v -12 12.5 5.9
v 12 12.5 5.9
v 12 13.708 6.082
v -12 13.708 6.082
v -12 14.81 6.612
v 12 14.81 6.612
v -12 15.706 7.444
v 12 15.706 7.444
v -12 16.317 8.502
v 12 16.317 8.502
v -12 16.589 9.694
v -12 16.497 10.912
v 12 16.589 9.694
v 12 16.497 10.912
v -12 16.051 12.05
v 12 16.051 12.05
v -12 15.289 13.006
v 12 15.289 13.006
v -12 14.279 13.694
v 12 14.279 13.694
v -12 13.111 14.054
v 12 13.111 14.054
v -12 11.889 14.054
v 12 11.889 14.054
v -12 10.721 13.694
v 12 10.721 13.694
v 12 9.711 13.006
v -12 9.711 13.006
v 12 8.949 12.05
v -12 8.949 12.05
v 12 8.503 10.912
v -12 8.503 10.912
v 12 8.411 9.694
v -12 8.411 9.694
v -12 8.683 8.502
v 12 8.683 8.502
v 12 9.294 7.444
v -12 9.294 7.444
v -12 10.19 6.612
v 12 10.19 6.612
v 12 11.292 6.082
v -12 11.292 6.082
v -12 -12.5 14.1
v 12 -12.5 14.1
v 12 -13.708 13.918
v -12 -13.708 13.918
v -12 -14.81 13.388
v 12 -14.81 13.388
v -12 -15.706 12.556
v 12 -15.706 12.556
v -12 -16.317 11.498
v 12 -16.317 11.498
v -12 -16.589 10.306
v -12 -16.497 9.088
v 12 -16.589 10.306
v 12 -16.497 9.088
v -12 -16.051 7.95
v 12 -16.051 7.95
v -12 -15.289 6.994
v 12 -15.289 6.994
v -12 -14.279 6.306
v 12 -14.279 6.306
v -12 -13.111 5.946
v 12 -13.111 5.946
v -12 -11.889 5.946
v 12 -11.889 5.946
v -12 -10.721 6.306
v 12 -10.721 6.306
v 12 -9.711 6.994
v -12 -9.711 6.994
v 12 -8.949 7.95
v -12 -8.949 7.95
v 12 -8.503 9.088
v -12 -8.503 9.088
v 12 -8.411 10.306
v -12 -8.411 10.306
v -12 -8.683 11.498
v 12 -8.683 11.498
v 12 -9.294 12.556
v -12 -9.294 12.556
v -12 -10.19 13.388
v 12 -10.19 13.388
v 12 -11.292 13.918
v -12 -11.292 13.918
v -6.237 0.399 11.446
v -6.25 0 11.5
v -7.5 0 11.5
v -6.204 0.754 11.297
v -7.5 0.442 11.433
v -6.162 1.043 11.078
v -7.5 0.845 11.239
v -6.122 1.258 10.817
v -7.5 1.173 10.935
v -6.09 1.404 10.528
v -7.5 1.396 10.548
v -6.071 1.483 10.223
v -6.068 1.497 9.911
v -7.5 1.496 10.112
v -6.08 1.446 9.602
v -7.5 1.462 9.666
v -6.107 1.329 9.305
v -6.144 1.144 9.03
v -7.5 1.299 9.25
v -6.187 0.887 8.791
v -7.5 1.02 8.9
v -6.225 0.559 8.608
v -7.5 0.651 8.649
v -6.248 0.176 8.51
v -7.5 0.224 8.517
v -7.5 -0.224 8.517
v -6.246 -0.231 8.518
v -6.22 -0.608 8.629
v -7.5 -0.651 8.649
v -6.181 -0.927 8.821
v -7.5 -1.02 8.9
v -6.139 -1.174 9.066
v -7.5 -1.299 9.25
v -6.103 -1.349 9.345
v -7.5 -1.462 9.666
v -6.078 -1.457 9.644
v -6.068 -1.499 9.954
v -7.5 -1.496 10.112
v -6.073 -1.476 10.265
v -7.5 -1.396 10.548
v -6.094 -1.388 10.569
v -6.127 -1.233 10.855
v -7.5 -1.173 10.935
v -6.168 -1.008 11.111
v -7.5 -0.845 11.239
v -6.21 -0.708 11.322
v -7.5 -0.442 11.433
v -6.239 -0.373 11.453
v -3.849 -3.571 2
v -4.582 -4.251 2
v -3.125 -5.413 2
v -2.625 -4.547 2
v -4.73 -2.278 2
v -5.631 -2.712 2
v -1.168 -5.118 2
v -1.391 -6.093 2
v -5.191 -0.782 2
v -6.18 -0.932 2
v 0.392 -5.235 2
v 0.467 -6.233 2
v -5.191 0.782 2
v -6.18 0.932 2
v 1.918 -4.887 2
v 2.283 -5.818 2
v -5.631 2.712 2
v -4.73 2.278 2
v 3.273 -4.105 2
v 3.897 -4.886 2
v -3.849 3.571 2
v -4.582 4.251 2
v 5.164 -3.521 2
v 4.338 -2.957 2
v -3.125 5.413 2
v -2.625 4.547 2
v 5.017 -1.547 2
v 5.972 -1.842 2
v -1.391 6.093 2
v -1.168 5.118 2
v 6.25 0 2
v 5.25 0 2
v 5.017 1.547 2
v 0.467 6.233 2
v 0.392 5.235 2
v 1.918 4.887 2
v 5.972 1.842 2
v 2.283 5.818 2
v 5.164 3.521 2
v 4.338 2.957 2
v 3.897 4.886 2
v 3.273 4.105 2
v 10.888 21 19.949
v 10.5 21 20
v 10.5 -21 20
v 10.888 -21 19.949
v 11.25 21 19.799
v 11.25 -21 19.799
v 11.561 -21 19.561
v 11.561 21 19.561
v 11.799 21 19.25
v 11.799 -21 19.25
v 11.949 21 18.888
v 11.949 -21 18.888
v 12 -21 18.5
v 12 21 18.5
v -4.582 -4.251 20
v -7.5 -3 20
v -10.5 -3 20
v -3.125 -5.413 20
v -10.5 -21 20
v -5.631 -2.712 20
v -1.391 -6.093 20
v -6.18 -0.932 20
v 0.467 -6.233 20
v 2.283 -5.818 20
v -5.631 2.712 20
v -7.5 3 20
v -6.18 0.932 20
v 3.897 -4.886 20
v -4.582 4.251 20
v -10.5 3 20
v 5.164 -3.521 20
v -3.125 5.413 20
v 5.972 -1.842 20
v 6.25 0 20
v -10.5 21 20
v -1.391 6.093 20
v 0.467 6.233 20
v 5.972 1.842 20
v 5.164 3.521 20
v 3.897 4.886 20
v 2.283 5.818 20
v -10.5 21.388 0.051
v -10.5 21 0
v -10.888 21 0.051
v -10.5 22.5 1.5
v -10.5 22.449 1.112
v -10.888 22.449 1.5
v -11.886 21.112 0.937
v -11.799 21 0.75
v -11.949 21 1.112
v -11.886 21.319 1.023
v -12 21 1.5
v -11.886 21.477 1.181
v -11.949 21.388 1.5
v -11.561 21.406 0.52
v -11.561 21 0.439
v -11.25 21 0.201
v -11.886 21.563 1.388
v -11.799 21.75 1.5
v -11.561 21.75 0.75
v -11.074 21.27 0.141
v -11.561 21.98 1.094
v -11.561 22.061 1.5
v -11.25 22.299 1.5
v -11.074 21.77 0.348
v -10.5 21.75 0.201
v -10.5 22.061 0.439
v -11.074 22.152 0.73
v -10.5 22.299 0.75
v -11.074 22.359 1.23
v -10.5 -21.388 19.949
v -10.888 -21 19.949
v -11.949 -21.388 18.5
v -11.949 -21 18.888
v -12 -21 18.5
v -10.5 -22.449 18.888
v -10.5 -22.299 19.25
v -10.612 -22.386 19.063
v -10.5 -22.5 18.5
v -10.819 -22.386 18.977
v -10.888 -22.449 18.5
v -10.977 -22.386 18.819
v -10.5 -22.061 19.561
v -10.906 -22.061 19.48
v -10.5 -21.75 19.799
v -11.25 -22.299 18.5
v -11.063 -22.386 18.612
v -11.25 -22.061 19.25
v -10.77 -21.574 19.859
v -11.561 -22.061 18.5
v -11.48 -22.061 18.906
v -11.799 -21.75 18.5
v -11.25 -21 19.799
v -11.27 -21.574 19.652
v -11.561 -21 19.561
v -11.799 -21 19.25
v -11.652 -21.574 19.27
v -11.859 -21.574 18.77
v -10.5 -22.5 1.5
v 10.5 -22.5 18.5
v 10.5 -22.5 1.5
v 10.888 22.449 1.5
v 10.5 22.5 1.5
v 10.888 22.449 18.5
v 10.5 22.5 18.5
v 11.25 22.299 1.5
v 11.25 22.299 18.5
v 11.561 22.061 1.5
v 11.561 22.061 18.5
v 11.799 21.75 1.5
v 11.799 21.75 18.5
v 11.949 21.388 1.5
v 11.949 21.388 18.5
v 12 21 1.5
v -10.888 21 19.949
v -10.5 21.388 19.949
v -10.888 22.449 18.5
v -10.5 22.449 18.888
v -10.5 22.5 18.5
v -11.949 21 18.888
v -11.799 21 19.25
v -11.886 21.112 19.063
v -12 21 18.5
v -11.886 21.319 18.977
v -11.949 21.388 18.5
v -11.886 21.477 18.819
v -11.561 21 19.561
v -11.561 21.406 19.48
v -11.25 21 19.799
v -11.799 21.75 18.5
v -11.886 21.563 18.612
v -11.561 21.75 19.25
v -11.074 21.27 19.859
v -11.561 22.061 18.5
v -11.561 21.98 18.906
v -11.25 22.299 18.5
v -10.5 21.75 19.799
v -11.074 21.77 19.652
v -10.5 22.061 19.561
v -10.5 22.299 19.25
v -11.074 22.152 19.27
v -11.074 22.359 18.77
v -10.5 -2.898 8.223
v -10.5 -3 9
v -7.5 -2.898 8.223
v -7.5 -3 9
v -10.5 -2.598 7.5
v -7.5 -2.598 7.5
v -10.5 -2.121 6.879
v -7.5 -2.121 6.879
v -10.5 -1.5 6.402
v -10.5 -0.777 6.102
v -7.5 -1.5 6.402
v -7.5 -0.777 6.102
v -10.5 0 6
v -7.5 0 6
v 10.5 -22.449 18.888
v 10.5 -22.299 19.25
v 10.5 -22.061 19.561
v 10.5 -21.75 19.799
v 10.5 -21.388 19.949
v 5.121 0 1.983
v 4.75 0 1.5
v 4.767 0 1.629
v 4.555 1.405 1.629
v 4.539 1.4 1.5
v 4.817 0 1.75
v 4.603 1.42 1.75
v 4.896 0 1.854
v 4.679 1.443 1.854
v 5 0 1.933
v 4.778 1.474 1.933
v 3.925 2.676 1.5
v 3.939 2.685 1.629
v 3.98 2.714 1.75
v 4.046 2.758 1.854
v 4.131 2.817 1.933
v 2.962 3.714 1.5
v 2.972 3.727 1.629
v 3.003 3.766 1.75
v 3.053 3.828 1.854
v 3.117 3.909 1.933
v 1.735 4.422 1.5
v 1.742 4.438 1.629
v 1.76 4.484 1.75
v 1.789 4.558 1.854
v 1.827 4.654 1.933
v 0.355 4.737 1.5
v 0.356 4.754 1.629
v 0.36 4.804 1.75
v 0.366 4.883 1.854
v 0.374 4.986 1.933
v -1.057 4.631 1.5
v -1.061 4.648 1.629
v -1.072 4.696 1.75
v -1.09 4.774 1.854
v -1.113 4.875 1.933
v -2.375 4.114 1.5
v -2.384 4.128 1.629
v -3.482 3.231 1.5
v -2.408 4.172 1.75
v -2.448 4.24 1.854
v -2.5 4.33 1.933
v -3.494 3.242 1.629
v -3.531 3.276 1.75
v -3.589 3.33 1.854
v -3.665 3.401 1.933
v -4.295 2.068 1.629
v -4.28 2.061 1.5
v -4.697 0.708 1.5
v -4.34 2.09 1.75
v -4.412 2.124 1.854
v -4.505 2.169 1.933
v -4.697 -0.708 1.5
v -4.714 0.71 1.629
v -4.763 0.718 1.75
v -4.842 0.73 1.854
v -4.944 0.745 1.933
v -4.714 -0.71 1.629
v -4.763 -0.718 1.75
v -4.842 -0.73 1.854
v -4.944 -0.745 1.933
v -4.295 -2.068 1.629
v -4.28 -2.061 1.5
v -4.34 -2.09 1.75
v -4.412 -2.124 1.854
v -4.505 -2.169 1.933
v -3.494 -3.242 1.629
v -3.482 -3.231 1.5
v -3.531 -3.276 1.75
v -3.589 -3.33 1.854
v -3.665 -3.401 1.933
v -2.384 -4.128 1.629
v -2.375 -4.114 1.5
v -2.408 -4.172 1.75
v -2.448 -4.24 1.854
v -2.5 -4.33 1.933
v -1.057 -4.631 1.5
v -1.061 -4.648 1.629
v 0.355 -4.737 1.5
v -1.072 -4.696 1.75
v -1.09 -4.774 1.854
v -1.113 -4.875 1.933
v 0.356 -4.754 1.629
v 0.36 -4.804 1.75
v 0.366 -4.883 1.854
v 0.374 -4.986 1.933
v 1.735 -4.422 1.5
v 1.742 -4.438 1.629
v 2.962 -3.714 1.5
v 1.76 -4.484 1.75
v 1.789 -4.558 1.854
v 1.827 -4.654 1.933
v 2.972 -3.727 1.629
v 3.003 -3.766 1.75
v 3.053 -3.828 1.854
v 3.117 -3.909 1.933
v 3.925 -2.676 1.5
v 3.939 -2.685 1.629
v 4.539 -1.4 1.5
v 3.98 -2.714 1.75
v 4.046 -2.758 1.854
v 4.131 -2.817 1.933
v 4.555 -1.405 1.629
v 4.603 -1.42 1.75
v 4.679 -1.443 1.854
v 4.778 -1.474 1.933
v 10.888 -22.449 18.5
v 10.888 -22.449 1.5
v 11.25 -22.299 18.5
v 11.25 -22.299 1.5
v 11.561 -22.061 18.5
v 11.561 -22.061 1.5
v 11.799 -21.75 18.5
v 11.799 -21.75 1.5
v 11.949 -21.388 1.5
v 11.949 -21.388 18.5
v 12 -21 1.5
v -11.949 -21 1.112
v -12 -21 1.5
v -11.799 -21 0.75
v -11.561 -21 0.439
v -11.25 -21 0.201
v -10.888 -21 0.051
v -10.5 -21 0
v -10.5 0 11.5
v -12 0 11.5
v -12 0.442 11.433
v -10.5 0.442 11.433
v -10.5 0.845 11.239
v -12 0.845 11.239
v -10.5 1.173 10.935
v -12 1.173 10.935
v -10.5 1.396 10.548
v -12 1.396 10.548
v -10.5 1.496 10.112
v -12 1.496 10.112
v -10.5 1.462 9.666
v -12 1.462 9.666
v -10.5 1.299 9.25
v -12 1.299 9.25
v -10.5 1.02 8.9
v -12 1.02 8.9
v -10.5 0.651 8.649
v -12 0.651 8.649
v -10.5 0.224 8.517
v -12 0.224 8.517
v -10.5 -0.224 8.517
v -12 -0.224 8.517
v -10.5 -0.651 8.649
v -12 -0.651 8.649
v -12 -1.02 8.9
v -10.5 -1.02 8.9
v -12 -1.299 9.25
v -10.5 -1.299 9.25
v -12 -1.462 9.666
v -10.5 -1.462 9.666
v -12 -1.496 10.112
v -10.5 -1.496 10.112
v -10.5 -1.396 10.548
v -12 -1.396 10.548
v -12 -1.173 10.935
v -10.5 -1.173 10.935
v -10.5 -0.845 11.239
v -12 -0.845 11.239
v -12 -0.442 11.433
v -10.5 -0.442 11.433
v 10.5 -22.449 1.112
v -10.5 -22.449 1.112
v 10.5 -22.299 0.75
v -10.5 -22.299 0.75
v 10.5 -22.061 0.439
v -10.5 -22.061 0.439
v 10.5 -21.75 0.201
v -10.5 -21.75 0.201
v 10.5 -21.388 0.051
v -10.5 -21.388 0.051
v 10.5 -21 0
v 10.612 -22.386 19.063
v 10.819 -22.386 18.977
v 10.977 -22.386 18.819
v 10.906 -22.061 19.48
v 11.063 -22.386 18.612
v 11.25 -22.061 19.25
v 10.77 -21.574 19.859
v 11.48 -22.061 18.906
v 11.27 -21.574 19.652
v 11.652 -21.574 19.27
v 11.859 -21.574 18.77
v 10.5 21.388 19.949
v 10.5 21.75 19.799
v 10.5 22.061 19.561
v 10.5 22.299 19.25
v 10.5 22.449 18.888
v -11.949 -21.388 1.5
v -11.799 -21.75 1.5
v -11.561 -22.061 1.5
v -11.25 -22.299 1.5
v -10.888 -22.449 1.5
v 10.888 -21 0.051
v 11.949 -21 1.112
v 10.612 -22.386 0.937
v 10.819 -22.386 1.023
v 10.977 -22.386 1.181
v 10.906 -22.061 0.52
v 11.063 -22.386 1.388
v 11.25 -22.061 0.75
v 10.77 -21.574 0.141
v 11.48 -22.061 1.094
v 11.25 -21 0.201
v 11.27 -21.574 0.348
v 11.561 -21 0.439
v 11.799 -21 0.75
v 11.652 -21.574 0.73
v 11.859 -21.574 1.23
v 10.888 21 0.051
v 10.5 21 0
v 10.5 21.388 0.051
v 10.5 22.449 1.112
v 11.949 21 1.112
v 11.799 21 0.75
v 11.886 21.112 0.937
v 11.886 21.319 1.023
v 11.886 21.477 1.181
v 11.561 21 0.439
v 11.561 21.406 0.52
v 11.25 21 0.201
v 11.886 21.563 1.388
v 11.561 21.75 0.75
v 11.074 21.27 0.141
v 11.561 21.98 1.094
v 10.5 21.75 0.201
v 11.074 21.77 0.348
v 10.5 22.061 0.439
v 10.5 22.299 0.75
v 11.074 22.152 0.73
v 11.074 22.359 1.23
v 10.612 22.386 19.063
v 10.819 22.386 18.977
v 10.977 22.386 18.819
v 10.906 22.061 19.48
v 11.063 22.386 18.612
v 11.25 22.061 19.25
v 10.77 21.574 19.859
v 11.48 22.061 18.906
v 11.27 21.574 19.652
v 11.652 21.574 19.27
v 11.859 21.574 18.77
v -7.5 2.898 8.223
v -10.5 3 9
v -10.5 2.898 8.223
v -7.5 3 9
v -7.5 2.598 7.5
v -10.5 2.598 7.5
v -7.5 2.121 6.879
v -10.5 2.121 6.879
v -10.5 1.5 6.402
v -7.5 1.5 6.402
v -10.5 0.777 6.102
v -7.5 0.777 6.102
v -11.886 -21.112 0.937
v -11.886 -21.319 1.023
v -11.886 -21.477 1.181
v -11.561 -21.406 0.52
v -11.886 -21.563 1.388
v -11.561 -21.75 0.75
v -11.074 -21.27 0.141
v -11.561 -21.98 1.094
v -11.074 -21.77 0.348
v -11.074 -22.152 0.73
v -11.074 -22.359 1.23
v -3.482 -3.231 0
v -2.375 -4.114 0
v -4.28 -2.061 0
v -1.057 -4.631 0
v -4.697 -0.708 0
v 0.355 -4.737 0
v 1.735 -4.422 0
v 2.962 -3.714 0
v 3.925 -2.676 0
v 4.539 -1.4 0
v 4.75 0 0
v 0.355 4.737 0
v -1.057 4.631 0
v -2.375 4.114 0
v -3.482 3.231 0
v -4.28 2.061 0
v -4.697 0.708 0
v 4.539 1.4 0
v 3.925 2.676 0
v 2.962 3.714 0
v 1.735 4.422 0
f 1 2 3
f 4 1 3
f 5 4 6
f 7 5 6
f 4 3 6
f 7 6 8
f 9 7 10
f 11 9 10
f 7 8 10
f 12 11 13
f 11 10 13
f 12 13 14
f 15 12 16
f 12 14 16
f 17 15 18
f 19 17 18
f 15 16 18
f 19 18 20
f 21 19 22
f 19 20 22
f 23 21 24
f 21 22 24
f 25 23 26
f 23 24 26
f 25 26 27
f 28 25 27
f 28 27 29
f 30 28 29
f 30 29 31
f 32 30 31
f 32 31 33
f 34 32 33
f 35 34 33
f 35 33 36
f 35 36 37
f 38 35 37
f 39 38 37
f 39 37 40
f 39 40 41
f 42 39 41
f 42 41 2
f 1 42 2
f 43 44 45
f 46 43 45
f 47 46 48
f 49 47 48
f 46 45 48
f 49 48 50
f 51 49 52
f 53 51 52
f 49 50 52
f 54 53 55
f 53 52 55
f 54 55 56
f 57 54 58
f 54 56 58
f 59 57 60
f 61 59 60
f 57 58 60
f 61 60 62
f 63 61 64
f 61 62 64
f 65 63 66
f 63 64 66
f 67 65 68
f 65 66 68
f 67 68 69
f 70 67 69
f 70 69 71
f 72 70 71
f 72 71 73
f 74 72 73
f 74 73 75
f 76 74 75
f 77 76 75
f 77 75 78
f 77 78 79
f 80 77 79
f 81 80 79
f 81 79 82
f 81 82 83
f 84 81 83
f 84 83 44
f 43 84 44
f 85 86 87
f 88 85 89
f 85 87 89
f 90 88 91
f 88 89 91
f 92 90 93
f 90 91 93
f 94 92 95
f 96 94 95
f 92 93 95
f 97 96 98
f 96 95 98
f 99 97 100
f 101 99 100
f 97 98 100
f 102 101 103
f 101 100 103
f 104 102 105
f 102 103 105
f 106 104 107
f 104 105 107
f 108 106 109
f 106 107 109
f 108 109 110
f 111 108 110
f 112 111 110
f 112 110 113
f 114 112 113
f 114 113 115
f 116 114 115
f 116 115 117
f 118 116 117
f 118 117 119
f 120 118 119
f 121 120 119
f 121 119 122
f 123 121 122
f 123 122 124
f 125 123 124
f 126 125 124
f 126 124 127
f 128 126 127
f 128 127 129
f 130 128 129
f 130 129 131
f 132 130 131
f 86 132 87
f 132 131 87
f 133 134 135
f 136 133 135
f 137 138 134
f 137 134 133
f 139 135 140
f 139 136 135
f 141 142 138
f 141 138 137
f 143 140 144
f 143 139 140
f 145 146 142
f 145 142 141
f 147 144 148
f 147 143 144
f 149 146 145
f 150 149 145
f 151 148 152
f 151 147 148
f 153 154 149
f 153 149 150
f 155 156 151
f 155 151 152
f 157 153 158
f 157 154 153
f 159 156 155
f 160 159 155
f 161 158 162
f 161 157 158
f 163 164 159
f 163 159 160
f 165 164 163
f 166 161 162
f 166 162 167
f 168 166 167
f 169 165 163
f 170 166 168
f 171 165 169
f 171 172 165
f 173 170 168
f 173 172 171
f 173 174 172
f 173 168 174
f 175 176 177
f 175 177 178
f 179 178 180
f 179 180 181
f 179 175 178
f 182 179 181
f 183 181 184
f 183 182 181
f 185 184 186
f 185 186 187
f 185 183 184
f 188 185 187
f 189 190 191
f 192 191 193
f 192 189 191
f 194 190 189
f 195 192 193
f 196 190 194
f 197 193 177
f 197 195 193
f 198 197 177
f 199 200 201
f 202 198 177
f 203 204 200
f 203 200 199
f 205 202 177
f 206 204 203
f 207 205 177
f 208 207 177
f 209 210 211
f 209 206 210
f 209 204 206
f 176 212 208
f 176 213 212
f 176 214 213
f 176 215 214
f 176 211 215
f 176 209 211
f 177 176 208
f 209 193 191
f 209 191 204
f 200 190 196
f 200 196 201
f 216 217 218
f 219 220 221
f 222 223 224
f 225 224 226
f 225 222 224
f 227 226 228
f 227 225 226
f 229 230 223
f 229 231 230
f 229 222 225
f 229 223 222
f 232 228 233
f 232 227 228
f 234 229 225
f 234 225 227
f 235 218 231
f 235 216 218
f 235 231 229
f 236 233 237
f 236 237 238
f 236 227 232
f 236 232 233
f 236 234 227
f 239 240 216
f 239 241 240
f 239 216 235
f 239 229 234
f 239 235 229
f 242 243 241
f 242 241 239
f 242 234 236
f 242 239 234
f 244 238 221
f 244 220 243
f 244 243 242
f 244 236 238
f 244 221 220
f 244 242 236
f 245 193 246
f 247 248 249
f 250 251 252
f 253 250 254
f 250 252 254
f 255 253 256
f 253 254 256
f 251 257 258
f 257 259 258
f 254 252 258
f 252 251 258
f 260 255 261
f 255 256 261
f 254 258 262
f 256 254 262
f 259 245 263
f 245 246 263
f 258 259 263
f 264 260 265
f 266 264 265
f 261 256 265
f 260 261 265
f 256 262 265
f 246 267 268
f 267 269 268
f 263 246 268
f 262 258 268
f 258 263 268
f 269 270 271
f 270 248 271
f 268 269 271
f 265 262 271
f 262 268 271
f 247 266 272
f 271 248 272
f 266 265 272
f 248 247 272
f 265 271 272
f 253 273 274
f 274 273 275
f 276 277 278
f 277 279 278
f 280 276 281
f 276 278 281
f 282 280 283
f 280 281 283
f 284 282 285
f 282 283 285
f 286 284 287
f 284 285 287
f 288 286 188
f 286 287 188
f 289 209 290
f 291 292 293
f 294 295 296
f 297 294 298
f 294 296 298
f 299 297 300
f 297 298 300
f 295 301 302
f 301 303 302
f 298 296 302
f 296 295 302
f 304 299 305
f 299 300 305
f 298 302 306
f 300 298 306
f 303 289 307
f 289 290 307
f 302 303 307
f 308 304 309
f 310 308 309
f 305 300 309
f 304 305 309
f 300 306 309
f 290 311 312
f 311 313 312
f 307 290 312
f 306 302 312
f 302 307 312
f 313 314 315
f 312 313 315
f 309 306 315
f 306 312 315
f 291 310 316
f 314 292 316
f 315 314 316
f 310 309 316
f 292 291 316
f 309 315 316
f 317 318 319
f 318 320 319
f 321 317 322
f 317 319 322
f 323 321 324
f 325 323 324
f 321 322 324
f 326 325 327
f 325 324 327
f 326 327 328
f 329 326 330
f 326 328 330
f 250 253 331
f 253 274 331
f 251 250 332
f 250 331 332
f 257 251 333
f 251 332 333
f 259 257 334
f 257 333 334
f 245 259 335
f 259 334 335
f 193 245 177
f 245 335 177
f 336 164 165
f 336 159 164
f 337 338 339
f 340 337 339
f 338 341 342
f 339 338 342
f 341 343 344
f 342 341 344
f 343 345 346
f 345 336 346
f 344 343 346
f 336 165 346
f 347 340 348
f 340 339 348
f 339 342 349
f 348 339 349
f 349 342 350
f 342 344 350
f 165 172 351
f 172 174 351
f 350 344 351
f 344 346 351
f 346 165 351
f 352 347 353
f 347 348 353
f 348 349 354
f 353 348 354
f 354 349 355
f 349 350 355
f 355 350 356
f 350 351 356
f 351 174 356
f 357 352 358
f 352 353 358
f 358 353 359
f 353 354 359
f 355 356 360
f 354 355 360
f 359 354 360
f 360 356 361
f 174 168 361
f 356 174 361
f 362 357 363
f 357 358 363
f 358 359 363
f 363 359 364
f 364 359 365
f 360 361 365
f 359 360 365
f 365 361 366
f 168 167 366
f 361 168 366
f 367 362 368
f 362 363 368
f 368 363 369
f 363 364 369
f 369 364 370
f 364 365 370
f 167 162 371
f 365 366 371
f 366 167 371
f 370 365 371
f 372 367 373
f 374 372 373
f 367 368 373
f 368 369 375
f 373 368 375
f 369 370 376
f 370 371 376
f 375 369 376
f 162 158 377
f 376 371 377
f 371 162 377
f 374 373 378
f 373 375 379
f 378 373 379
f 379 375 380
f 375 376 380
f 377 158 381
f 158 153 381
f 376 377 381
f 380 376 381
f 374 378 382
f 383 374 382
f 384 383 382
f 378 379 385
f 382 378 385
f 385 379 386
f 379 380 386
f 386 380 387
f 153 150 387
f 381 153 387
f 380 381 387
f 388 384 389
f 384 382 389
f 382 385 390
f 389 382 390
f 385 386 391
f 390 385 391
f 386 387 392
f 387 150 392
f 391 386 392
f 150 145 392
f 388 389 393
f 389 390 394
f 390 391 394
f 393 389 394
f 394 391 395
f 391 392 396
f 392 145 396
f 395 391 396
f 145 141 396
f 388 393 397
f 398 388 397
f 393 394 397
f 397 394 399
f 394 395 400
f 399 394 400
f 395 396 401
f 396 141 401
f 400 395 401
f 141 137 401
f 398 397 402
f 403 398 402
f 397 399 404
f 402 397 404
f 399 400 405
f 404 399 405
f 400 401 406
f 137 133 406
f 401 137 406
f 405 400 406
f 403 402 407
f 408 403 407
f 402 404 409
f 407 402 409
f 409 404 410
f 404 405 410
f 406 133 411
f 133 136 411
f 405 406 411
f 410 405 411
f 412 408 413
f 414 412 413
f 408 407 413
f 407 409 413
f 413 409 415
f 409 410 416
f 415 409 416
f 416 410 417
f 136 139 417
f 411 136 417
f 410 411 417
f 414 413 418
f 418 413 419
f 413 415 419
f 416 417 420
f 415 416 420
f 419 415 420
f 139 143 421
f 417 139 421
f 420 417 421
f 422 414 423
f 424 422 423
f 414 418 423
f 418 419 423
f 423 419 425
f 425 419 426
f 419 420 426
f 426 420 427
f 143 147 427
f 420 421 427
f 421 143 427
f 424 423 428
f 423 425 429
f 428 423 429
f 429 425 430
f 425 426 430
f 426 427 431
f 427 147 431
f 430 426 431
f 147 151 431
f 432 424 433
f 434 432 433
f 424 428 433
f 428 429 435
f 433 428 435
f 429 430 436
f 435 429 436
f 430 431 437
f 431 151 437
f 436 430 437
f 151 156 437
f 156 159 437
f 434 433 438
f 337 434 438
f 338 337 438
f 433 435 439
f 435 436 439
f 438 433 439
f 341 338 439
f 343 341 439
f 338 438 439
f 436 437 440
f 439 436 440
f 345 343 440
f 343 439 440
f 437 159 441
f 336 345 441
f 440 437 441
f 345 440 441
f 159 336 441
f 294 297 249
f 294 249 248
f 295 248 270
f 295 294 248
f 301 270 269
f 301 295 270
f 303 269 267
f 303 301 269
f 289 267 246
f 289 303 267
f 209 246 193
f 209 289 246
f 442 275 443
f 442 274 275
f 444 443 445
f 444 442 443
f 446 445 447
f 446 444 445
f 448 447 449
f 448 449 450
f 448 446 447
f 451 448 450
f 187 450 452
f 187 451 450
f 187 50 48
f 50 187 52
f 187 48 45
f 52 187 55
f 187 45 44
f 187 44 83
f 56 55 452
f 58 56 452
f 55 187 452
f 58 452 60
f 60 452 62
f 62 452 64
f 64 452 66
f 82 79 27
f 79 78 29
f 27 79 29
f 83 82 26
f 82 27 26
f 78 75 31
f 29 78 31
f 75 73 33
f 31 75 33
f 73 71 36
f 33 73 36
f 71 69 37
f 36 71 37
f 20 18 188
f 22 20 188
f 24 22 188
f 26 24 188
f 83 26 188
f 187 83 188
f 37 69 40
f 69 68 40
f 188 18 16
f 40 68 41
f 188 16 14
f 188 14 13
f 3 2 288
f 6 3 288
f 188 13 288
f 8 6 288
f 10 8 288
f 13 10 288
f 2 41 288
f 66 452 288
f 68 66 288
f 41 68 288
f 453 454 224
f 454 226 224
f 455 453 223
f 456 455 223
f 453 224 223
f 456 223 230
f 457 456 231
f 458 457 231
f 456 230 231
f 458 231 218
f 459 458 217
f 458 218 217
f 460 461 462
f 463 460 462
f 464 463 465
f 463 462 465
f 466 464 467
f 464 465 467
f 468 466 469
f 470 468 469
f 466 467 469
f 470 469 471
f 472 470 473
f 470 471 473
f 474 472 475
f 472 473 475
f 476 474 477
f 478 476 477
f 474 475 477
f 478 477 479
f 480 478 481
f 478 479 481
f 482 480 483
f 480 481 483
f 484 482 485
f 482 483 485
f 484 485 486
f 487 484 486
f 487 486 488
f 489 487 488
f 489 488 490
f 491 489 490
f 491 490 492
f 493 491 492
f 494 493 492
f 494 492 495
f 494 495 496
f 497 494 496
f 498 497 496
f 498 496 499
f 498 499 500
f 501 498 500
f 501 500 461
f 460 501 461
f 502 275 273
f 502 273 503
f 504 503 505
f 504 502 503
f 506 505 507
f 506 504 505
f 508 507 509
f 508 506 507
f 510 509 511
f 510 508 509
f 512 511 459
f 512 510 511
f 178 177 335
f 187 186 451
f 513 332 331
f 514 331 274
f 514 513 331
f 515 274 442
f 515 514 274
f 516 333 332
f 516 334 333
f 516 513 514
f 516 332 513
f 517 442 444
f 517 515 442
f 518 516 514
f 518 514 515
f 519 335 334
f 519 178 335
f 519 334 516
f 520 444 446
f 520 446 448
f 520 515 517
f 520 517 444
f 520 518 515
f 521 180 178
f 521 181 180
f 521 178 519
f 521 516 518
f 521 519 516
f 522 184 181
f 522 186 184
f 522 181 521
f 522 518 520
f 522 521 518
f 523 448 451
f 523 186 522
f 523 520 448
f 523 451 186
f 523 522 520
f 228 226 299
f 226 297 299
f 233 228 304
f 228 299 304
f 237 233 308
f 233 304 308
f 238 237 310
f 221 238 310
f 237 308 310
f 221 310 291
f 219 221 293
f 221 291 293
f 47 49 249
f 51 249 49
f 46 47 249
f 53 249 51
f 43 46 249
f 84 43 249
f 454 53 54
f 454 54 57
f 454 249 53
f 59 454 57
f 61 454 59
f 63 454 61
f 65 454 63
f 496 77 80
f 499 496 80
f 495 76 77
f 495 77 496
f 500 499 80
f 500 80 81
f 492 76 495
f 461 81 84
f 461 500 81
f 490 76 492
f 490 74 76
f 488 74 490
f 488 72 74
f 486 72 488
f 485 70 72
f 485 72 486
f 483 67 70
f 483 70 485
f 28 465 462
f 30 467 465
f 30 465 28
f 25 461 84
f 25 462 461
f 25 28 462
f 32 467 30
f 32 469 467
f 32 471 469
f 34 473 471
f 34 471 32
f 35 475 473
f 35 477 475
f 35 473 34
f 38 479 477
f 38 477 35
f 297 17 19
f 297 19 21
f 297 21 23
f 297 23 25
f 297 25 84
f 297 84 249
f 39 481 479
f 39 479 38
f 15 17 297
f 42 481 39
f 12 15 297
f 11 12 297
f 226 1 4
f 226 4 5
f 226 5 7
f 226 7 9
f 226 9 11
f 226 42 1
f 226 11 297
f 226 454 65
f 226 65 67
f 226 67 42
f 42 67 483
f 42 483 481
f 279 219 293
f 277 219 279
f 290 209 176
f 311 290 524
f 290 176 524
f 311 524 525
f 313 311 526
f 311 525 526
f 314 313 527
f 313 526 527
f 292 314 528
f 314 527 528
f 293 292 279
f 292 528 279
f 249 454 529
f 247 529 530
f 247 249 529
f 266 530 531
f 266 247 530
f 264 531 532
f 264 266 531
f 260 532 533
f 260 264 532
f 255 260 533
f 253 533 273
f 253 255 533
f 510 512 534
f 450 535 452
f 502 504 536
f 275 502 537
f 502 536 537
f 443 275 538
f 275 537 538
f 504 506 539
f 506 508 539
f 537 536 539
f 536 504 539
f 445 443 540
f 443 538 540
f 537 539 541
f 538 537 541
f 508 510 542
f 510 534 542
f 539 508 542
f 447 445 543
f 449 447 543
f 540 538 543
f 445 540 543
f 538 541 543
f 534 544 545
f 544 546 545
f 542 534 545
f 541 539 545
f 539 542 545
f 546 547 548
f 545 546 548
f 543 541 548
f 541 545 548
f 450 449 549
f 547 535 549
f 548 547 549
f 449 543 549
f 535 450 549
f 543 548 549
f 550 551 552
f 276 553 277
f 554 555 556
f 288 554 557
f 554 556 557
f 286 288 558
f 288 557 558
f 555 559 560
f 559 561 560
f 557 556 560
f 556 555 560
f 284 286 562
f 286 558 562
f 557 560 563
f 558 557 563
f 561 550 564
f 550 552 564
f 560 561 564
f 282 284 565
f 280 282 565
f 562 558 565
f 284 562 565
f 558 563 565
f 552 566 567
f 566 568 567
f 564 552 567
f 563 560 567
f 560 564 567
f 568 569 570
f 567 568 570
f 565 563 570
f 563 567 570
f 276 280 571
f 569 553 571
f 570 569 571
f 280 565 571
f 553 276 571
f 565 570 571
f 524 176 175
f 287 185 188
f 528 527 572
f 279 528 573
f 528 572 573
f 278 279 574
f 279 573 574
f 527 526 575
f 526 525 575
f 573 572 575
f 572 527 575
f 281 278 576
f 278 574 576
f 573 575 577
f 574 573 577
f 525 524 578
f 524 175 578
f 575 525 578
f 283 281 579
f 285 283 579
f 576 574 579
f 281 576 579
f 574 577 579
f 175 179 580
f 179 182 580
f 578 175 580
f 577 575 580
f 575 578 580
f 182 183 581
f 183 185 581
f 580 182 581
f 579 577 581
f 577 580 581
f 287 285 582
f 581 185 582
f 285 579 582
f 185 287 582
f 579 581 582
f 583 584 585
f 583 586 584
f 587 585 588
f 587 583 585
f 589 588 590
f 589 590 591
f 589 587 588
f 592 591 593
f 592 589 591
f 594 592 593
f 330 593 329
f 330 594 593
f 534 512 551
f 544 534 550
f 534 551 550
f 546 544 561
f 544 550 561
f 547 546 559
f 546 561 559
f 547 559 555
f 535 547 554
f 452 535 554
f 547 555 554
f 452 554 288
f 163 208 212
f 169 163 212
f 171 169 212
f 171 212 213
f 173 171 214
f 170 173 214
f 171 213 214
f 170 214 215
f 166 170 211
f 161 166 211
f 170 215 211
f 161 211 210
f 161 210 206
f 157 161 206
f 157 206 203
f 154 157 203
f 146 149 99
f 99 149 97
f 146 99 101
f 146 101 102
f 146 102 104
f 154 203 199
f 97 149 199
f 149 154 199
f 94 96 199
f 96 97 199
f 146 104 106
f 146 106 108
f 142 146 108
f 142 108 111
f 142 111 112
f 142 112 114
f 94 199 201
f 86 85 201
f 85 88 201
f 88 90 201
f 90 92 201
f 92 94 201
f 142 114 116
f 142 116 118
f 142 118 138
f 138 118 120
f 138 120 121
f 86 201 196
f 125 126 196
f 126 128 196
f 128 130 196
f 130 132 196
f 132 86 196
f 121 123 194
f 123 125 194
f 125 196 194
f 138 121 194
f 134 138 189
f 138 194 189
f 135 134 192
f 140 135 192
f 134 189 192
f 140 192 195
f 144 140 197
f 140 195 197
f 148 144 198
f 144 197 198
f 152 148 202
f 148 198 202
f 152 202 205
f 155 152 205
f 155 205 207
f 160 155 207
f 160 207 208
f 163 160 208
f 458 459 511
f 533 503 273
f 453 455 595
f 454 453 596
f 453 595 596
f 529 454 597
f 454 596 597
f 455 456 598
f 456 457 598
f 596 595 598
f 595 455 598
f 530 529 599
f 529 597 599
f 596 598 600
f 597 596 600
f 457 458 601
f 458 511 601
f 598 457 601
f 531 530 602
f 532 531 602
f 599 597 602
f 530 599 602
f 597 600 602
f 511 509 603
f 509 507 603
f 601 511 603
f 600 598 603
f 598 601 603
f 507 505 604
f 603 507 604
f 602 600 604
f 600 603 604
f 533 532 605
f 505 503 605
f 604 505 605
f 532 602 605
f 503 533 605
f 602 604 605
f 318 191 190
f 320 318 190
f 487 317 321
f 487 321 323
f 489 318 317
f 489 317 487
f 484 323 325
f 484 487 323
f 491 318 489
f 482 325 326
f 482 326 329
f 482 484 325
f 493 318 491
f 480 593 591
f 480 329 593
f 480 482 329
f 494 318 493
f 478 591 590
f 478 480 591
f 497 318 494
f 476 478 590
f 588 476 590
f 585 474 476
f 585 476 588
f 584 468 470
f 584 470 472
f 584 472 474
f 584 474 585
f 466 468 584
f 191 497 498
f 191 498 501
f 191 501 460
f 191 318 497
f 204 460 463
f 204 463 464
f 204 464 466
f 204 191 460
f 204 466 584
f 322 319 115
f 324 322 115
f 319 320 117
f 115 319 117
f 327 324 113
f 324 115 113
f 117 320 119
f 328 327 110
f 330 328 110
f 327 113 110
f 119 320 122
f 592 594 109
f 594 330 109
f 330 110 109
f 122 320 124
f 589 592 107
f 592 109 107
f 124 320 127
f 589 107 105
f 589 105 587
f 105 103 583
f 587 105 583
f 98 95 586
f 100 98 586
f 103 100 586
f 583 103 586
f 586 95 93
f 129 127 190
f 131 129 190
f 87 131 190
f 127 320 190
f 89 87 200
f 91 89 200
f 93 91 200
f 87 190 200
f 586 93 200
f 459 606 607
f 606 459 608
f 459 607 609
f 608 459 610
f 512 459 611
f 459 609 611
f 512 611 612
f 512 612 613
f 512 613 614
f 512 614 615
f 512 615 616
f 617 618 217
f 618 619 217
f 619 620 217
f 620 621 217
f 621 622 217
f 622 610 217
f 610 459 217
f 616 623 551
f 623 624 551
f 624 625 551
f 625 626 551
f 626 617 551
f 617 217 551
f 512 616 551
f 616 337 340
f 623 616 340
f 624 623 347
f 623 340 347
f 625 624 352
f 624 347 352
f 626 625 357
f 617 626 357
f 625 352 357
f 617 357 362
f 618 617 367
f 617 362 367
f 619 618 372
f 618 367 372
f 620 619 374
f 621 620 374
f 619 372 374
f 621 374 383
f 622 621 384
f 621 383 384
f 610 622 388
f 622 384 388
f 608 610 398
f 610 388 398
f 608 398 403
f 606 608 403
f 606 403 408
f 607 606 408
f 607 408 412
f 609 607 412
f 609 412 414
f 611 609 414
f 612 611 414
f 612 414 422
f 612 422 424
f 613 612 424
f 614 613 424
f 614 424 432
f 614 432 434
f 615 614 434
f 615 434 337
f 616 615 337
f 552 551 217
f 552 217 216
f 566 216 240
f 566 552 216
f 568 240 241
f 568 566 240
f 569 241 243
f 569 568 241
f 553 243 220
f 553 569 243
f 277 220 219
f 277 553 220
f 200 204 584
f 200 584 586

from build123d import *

# Parameters (mm, degrees)
SKETCH1_W      = 24
SKETCH1_H      = 45
EXTRUDE1_DEPTH = 20
SKETCH2_R      = 4.1
EXTRUDE2_DEPTH = 39.5
SKETCH3_R      = 6.25
EXTRUDE3_DEPTH = 18
SKETCH4_R      = 4.75
EXTRUDE4_DEPTH = 18
SKETCH5_W      = 3
SKETCH5_H      = 6
EXTRUDE5_DEPTH = 14
SKETCH6_R      = 1.5
EXTRUDE6_DEPTH = 13
FILLET1_R      = 1.5
FILLET2_R      = 0.5
FILLET3_R      = 3


with BuildPart() as part:
    # Sketch1 → Extrude1 (new body)
    with BuildSketch(Plane.XY):
        Rectangle(SKETCH1_W, SKETCH1_H)
    extrude(amount=EXTRUDE1_DEPTH)

    # Sketch2 → Extrude2 (cut, through all)
    with BuildSketch(Plane(origin=(12, 0, 0), x_dir=(0, 0, -1), z_dir=(1, 0, 0))):
        with Locations((-10, 12.5)):
            Circle(SKETCH2_R)
        with Locations(Location((-10, -12.5, 0), (0, 0, 180))):
            Circle(SKETCH2_R)
    extrude(amount=-EXTRUDE2_DEPTH, mode=Mode.SUBTRACT)

    # Sketch3 → Extrude3 (cut)
    with BuildSketch(Plane.XY.offset(20)):
        Circle(SKETCH3_R)
    extrude(amount=-EXTRUDE3_DEPTH, mode=Mode.SUBTRACT)

    # Sketch4 → Extrude4 (cut)
    with BuildSketch(Plane.XY.offset(2)):
        Circle(SKETCH4_R)
    extrude(amount=-EXTRUDE4_DEPTH, mode=Mode.SUBTRACT)

    # Sketch5 → Extrude5 (cut)
    with BuildSketch(Plane.XY.offset(20)):
        with Locations((-9, 0)):
            Rectangle(SKETCH5_W, SKETCH5_H)
    extrude(amount=-EXTRUDE5_DEPTH, mode=Mode.SUBTRACT)

    # Sketch6 → Extrude6 (cut)
    with BuildSketch(Plane.ZY.offset(12)):
        with Locations((10, 0)):
            Circle(SKETCH6_R)
    extrude(amount=-EXTRUDE6_DEPTH, mode=Mode.SUBTRACT)

    # Fillet1
    fillet1_edges = [part.edges().sort_by_distance(p)[0] for p in [
        (12, 0, 20),
        (0, 22.5, 20),
        (-12, 0, 20),
        (0, 22.5, 0),
        (12, 0, 0),
        (0, -22.5, 0),
        (-12, 0, 0),
        (0, -22.5, 20),
        (-12, 22.5, 10),
        (12, 22.5, 10),
        (12, -22.5, 10),
        (-12, -22.5, 10),
    ]]
    fillet(fillet1_edges, radius=FILLET1_R - 0.0001)  # a hair under: the kernel refuses the full size

    # Fillet2
    fillet2_edges = [part.edges().sort_by_distance(p)[0] for p in [
        (-4.75, 0, 2),
    ]]
    fillet(fillet2_edges, radius=FILLET2_R)

    # Fillet3
    fillet3_edges = [part.edges().sort_by_distance(p)[0] for p in [
        (-9, -3, 6),
        (-9, 3, 6),
    ]]
    fillet(fillet3_edges, radius=FILLET3_R - 0.0001)  # a hair under: the kernel refuses the full size


solid = part.part
